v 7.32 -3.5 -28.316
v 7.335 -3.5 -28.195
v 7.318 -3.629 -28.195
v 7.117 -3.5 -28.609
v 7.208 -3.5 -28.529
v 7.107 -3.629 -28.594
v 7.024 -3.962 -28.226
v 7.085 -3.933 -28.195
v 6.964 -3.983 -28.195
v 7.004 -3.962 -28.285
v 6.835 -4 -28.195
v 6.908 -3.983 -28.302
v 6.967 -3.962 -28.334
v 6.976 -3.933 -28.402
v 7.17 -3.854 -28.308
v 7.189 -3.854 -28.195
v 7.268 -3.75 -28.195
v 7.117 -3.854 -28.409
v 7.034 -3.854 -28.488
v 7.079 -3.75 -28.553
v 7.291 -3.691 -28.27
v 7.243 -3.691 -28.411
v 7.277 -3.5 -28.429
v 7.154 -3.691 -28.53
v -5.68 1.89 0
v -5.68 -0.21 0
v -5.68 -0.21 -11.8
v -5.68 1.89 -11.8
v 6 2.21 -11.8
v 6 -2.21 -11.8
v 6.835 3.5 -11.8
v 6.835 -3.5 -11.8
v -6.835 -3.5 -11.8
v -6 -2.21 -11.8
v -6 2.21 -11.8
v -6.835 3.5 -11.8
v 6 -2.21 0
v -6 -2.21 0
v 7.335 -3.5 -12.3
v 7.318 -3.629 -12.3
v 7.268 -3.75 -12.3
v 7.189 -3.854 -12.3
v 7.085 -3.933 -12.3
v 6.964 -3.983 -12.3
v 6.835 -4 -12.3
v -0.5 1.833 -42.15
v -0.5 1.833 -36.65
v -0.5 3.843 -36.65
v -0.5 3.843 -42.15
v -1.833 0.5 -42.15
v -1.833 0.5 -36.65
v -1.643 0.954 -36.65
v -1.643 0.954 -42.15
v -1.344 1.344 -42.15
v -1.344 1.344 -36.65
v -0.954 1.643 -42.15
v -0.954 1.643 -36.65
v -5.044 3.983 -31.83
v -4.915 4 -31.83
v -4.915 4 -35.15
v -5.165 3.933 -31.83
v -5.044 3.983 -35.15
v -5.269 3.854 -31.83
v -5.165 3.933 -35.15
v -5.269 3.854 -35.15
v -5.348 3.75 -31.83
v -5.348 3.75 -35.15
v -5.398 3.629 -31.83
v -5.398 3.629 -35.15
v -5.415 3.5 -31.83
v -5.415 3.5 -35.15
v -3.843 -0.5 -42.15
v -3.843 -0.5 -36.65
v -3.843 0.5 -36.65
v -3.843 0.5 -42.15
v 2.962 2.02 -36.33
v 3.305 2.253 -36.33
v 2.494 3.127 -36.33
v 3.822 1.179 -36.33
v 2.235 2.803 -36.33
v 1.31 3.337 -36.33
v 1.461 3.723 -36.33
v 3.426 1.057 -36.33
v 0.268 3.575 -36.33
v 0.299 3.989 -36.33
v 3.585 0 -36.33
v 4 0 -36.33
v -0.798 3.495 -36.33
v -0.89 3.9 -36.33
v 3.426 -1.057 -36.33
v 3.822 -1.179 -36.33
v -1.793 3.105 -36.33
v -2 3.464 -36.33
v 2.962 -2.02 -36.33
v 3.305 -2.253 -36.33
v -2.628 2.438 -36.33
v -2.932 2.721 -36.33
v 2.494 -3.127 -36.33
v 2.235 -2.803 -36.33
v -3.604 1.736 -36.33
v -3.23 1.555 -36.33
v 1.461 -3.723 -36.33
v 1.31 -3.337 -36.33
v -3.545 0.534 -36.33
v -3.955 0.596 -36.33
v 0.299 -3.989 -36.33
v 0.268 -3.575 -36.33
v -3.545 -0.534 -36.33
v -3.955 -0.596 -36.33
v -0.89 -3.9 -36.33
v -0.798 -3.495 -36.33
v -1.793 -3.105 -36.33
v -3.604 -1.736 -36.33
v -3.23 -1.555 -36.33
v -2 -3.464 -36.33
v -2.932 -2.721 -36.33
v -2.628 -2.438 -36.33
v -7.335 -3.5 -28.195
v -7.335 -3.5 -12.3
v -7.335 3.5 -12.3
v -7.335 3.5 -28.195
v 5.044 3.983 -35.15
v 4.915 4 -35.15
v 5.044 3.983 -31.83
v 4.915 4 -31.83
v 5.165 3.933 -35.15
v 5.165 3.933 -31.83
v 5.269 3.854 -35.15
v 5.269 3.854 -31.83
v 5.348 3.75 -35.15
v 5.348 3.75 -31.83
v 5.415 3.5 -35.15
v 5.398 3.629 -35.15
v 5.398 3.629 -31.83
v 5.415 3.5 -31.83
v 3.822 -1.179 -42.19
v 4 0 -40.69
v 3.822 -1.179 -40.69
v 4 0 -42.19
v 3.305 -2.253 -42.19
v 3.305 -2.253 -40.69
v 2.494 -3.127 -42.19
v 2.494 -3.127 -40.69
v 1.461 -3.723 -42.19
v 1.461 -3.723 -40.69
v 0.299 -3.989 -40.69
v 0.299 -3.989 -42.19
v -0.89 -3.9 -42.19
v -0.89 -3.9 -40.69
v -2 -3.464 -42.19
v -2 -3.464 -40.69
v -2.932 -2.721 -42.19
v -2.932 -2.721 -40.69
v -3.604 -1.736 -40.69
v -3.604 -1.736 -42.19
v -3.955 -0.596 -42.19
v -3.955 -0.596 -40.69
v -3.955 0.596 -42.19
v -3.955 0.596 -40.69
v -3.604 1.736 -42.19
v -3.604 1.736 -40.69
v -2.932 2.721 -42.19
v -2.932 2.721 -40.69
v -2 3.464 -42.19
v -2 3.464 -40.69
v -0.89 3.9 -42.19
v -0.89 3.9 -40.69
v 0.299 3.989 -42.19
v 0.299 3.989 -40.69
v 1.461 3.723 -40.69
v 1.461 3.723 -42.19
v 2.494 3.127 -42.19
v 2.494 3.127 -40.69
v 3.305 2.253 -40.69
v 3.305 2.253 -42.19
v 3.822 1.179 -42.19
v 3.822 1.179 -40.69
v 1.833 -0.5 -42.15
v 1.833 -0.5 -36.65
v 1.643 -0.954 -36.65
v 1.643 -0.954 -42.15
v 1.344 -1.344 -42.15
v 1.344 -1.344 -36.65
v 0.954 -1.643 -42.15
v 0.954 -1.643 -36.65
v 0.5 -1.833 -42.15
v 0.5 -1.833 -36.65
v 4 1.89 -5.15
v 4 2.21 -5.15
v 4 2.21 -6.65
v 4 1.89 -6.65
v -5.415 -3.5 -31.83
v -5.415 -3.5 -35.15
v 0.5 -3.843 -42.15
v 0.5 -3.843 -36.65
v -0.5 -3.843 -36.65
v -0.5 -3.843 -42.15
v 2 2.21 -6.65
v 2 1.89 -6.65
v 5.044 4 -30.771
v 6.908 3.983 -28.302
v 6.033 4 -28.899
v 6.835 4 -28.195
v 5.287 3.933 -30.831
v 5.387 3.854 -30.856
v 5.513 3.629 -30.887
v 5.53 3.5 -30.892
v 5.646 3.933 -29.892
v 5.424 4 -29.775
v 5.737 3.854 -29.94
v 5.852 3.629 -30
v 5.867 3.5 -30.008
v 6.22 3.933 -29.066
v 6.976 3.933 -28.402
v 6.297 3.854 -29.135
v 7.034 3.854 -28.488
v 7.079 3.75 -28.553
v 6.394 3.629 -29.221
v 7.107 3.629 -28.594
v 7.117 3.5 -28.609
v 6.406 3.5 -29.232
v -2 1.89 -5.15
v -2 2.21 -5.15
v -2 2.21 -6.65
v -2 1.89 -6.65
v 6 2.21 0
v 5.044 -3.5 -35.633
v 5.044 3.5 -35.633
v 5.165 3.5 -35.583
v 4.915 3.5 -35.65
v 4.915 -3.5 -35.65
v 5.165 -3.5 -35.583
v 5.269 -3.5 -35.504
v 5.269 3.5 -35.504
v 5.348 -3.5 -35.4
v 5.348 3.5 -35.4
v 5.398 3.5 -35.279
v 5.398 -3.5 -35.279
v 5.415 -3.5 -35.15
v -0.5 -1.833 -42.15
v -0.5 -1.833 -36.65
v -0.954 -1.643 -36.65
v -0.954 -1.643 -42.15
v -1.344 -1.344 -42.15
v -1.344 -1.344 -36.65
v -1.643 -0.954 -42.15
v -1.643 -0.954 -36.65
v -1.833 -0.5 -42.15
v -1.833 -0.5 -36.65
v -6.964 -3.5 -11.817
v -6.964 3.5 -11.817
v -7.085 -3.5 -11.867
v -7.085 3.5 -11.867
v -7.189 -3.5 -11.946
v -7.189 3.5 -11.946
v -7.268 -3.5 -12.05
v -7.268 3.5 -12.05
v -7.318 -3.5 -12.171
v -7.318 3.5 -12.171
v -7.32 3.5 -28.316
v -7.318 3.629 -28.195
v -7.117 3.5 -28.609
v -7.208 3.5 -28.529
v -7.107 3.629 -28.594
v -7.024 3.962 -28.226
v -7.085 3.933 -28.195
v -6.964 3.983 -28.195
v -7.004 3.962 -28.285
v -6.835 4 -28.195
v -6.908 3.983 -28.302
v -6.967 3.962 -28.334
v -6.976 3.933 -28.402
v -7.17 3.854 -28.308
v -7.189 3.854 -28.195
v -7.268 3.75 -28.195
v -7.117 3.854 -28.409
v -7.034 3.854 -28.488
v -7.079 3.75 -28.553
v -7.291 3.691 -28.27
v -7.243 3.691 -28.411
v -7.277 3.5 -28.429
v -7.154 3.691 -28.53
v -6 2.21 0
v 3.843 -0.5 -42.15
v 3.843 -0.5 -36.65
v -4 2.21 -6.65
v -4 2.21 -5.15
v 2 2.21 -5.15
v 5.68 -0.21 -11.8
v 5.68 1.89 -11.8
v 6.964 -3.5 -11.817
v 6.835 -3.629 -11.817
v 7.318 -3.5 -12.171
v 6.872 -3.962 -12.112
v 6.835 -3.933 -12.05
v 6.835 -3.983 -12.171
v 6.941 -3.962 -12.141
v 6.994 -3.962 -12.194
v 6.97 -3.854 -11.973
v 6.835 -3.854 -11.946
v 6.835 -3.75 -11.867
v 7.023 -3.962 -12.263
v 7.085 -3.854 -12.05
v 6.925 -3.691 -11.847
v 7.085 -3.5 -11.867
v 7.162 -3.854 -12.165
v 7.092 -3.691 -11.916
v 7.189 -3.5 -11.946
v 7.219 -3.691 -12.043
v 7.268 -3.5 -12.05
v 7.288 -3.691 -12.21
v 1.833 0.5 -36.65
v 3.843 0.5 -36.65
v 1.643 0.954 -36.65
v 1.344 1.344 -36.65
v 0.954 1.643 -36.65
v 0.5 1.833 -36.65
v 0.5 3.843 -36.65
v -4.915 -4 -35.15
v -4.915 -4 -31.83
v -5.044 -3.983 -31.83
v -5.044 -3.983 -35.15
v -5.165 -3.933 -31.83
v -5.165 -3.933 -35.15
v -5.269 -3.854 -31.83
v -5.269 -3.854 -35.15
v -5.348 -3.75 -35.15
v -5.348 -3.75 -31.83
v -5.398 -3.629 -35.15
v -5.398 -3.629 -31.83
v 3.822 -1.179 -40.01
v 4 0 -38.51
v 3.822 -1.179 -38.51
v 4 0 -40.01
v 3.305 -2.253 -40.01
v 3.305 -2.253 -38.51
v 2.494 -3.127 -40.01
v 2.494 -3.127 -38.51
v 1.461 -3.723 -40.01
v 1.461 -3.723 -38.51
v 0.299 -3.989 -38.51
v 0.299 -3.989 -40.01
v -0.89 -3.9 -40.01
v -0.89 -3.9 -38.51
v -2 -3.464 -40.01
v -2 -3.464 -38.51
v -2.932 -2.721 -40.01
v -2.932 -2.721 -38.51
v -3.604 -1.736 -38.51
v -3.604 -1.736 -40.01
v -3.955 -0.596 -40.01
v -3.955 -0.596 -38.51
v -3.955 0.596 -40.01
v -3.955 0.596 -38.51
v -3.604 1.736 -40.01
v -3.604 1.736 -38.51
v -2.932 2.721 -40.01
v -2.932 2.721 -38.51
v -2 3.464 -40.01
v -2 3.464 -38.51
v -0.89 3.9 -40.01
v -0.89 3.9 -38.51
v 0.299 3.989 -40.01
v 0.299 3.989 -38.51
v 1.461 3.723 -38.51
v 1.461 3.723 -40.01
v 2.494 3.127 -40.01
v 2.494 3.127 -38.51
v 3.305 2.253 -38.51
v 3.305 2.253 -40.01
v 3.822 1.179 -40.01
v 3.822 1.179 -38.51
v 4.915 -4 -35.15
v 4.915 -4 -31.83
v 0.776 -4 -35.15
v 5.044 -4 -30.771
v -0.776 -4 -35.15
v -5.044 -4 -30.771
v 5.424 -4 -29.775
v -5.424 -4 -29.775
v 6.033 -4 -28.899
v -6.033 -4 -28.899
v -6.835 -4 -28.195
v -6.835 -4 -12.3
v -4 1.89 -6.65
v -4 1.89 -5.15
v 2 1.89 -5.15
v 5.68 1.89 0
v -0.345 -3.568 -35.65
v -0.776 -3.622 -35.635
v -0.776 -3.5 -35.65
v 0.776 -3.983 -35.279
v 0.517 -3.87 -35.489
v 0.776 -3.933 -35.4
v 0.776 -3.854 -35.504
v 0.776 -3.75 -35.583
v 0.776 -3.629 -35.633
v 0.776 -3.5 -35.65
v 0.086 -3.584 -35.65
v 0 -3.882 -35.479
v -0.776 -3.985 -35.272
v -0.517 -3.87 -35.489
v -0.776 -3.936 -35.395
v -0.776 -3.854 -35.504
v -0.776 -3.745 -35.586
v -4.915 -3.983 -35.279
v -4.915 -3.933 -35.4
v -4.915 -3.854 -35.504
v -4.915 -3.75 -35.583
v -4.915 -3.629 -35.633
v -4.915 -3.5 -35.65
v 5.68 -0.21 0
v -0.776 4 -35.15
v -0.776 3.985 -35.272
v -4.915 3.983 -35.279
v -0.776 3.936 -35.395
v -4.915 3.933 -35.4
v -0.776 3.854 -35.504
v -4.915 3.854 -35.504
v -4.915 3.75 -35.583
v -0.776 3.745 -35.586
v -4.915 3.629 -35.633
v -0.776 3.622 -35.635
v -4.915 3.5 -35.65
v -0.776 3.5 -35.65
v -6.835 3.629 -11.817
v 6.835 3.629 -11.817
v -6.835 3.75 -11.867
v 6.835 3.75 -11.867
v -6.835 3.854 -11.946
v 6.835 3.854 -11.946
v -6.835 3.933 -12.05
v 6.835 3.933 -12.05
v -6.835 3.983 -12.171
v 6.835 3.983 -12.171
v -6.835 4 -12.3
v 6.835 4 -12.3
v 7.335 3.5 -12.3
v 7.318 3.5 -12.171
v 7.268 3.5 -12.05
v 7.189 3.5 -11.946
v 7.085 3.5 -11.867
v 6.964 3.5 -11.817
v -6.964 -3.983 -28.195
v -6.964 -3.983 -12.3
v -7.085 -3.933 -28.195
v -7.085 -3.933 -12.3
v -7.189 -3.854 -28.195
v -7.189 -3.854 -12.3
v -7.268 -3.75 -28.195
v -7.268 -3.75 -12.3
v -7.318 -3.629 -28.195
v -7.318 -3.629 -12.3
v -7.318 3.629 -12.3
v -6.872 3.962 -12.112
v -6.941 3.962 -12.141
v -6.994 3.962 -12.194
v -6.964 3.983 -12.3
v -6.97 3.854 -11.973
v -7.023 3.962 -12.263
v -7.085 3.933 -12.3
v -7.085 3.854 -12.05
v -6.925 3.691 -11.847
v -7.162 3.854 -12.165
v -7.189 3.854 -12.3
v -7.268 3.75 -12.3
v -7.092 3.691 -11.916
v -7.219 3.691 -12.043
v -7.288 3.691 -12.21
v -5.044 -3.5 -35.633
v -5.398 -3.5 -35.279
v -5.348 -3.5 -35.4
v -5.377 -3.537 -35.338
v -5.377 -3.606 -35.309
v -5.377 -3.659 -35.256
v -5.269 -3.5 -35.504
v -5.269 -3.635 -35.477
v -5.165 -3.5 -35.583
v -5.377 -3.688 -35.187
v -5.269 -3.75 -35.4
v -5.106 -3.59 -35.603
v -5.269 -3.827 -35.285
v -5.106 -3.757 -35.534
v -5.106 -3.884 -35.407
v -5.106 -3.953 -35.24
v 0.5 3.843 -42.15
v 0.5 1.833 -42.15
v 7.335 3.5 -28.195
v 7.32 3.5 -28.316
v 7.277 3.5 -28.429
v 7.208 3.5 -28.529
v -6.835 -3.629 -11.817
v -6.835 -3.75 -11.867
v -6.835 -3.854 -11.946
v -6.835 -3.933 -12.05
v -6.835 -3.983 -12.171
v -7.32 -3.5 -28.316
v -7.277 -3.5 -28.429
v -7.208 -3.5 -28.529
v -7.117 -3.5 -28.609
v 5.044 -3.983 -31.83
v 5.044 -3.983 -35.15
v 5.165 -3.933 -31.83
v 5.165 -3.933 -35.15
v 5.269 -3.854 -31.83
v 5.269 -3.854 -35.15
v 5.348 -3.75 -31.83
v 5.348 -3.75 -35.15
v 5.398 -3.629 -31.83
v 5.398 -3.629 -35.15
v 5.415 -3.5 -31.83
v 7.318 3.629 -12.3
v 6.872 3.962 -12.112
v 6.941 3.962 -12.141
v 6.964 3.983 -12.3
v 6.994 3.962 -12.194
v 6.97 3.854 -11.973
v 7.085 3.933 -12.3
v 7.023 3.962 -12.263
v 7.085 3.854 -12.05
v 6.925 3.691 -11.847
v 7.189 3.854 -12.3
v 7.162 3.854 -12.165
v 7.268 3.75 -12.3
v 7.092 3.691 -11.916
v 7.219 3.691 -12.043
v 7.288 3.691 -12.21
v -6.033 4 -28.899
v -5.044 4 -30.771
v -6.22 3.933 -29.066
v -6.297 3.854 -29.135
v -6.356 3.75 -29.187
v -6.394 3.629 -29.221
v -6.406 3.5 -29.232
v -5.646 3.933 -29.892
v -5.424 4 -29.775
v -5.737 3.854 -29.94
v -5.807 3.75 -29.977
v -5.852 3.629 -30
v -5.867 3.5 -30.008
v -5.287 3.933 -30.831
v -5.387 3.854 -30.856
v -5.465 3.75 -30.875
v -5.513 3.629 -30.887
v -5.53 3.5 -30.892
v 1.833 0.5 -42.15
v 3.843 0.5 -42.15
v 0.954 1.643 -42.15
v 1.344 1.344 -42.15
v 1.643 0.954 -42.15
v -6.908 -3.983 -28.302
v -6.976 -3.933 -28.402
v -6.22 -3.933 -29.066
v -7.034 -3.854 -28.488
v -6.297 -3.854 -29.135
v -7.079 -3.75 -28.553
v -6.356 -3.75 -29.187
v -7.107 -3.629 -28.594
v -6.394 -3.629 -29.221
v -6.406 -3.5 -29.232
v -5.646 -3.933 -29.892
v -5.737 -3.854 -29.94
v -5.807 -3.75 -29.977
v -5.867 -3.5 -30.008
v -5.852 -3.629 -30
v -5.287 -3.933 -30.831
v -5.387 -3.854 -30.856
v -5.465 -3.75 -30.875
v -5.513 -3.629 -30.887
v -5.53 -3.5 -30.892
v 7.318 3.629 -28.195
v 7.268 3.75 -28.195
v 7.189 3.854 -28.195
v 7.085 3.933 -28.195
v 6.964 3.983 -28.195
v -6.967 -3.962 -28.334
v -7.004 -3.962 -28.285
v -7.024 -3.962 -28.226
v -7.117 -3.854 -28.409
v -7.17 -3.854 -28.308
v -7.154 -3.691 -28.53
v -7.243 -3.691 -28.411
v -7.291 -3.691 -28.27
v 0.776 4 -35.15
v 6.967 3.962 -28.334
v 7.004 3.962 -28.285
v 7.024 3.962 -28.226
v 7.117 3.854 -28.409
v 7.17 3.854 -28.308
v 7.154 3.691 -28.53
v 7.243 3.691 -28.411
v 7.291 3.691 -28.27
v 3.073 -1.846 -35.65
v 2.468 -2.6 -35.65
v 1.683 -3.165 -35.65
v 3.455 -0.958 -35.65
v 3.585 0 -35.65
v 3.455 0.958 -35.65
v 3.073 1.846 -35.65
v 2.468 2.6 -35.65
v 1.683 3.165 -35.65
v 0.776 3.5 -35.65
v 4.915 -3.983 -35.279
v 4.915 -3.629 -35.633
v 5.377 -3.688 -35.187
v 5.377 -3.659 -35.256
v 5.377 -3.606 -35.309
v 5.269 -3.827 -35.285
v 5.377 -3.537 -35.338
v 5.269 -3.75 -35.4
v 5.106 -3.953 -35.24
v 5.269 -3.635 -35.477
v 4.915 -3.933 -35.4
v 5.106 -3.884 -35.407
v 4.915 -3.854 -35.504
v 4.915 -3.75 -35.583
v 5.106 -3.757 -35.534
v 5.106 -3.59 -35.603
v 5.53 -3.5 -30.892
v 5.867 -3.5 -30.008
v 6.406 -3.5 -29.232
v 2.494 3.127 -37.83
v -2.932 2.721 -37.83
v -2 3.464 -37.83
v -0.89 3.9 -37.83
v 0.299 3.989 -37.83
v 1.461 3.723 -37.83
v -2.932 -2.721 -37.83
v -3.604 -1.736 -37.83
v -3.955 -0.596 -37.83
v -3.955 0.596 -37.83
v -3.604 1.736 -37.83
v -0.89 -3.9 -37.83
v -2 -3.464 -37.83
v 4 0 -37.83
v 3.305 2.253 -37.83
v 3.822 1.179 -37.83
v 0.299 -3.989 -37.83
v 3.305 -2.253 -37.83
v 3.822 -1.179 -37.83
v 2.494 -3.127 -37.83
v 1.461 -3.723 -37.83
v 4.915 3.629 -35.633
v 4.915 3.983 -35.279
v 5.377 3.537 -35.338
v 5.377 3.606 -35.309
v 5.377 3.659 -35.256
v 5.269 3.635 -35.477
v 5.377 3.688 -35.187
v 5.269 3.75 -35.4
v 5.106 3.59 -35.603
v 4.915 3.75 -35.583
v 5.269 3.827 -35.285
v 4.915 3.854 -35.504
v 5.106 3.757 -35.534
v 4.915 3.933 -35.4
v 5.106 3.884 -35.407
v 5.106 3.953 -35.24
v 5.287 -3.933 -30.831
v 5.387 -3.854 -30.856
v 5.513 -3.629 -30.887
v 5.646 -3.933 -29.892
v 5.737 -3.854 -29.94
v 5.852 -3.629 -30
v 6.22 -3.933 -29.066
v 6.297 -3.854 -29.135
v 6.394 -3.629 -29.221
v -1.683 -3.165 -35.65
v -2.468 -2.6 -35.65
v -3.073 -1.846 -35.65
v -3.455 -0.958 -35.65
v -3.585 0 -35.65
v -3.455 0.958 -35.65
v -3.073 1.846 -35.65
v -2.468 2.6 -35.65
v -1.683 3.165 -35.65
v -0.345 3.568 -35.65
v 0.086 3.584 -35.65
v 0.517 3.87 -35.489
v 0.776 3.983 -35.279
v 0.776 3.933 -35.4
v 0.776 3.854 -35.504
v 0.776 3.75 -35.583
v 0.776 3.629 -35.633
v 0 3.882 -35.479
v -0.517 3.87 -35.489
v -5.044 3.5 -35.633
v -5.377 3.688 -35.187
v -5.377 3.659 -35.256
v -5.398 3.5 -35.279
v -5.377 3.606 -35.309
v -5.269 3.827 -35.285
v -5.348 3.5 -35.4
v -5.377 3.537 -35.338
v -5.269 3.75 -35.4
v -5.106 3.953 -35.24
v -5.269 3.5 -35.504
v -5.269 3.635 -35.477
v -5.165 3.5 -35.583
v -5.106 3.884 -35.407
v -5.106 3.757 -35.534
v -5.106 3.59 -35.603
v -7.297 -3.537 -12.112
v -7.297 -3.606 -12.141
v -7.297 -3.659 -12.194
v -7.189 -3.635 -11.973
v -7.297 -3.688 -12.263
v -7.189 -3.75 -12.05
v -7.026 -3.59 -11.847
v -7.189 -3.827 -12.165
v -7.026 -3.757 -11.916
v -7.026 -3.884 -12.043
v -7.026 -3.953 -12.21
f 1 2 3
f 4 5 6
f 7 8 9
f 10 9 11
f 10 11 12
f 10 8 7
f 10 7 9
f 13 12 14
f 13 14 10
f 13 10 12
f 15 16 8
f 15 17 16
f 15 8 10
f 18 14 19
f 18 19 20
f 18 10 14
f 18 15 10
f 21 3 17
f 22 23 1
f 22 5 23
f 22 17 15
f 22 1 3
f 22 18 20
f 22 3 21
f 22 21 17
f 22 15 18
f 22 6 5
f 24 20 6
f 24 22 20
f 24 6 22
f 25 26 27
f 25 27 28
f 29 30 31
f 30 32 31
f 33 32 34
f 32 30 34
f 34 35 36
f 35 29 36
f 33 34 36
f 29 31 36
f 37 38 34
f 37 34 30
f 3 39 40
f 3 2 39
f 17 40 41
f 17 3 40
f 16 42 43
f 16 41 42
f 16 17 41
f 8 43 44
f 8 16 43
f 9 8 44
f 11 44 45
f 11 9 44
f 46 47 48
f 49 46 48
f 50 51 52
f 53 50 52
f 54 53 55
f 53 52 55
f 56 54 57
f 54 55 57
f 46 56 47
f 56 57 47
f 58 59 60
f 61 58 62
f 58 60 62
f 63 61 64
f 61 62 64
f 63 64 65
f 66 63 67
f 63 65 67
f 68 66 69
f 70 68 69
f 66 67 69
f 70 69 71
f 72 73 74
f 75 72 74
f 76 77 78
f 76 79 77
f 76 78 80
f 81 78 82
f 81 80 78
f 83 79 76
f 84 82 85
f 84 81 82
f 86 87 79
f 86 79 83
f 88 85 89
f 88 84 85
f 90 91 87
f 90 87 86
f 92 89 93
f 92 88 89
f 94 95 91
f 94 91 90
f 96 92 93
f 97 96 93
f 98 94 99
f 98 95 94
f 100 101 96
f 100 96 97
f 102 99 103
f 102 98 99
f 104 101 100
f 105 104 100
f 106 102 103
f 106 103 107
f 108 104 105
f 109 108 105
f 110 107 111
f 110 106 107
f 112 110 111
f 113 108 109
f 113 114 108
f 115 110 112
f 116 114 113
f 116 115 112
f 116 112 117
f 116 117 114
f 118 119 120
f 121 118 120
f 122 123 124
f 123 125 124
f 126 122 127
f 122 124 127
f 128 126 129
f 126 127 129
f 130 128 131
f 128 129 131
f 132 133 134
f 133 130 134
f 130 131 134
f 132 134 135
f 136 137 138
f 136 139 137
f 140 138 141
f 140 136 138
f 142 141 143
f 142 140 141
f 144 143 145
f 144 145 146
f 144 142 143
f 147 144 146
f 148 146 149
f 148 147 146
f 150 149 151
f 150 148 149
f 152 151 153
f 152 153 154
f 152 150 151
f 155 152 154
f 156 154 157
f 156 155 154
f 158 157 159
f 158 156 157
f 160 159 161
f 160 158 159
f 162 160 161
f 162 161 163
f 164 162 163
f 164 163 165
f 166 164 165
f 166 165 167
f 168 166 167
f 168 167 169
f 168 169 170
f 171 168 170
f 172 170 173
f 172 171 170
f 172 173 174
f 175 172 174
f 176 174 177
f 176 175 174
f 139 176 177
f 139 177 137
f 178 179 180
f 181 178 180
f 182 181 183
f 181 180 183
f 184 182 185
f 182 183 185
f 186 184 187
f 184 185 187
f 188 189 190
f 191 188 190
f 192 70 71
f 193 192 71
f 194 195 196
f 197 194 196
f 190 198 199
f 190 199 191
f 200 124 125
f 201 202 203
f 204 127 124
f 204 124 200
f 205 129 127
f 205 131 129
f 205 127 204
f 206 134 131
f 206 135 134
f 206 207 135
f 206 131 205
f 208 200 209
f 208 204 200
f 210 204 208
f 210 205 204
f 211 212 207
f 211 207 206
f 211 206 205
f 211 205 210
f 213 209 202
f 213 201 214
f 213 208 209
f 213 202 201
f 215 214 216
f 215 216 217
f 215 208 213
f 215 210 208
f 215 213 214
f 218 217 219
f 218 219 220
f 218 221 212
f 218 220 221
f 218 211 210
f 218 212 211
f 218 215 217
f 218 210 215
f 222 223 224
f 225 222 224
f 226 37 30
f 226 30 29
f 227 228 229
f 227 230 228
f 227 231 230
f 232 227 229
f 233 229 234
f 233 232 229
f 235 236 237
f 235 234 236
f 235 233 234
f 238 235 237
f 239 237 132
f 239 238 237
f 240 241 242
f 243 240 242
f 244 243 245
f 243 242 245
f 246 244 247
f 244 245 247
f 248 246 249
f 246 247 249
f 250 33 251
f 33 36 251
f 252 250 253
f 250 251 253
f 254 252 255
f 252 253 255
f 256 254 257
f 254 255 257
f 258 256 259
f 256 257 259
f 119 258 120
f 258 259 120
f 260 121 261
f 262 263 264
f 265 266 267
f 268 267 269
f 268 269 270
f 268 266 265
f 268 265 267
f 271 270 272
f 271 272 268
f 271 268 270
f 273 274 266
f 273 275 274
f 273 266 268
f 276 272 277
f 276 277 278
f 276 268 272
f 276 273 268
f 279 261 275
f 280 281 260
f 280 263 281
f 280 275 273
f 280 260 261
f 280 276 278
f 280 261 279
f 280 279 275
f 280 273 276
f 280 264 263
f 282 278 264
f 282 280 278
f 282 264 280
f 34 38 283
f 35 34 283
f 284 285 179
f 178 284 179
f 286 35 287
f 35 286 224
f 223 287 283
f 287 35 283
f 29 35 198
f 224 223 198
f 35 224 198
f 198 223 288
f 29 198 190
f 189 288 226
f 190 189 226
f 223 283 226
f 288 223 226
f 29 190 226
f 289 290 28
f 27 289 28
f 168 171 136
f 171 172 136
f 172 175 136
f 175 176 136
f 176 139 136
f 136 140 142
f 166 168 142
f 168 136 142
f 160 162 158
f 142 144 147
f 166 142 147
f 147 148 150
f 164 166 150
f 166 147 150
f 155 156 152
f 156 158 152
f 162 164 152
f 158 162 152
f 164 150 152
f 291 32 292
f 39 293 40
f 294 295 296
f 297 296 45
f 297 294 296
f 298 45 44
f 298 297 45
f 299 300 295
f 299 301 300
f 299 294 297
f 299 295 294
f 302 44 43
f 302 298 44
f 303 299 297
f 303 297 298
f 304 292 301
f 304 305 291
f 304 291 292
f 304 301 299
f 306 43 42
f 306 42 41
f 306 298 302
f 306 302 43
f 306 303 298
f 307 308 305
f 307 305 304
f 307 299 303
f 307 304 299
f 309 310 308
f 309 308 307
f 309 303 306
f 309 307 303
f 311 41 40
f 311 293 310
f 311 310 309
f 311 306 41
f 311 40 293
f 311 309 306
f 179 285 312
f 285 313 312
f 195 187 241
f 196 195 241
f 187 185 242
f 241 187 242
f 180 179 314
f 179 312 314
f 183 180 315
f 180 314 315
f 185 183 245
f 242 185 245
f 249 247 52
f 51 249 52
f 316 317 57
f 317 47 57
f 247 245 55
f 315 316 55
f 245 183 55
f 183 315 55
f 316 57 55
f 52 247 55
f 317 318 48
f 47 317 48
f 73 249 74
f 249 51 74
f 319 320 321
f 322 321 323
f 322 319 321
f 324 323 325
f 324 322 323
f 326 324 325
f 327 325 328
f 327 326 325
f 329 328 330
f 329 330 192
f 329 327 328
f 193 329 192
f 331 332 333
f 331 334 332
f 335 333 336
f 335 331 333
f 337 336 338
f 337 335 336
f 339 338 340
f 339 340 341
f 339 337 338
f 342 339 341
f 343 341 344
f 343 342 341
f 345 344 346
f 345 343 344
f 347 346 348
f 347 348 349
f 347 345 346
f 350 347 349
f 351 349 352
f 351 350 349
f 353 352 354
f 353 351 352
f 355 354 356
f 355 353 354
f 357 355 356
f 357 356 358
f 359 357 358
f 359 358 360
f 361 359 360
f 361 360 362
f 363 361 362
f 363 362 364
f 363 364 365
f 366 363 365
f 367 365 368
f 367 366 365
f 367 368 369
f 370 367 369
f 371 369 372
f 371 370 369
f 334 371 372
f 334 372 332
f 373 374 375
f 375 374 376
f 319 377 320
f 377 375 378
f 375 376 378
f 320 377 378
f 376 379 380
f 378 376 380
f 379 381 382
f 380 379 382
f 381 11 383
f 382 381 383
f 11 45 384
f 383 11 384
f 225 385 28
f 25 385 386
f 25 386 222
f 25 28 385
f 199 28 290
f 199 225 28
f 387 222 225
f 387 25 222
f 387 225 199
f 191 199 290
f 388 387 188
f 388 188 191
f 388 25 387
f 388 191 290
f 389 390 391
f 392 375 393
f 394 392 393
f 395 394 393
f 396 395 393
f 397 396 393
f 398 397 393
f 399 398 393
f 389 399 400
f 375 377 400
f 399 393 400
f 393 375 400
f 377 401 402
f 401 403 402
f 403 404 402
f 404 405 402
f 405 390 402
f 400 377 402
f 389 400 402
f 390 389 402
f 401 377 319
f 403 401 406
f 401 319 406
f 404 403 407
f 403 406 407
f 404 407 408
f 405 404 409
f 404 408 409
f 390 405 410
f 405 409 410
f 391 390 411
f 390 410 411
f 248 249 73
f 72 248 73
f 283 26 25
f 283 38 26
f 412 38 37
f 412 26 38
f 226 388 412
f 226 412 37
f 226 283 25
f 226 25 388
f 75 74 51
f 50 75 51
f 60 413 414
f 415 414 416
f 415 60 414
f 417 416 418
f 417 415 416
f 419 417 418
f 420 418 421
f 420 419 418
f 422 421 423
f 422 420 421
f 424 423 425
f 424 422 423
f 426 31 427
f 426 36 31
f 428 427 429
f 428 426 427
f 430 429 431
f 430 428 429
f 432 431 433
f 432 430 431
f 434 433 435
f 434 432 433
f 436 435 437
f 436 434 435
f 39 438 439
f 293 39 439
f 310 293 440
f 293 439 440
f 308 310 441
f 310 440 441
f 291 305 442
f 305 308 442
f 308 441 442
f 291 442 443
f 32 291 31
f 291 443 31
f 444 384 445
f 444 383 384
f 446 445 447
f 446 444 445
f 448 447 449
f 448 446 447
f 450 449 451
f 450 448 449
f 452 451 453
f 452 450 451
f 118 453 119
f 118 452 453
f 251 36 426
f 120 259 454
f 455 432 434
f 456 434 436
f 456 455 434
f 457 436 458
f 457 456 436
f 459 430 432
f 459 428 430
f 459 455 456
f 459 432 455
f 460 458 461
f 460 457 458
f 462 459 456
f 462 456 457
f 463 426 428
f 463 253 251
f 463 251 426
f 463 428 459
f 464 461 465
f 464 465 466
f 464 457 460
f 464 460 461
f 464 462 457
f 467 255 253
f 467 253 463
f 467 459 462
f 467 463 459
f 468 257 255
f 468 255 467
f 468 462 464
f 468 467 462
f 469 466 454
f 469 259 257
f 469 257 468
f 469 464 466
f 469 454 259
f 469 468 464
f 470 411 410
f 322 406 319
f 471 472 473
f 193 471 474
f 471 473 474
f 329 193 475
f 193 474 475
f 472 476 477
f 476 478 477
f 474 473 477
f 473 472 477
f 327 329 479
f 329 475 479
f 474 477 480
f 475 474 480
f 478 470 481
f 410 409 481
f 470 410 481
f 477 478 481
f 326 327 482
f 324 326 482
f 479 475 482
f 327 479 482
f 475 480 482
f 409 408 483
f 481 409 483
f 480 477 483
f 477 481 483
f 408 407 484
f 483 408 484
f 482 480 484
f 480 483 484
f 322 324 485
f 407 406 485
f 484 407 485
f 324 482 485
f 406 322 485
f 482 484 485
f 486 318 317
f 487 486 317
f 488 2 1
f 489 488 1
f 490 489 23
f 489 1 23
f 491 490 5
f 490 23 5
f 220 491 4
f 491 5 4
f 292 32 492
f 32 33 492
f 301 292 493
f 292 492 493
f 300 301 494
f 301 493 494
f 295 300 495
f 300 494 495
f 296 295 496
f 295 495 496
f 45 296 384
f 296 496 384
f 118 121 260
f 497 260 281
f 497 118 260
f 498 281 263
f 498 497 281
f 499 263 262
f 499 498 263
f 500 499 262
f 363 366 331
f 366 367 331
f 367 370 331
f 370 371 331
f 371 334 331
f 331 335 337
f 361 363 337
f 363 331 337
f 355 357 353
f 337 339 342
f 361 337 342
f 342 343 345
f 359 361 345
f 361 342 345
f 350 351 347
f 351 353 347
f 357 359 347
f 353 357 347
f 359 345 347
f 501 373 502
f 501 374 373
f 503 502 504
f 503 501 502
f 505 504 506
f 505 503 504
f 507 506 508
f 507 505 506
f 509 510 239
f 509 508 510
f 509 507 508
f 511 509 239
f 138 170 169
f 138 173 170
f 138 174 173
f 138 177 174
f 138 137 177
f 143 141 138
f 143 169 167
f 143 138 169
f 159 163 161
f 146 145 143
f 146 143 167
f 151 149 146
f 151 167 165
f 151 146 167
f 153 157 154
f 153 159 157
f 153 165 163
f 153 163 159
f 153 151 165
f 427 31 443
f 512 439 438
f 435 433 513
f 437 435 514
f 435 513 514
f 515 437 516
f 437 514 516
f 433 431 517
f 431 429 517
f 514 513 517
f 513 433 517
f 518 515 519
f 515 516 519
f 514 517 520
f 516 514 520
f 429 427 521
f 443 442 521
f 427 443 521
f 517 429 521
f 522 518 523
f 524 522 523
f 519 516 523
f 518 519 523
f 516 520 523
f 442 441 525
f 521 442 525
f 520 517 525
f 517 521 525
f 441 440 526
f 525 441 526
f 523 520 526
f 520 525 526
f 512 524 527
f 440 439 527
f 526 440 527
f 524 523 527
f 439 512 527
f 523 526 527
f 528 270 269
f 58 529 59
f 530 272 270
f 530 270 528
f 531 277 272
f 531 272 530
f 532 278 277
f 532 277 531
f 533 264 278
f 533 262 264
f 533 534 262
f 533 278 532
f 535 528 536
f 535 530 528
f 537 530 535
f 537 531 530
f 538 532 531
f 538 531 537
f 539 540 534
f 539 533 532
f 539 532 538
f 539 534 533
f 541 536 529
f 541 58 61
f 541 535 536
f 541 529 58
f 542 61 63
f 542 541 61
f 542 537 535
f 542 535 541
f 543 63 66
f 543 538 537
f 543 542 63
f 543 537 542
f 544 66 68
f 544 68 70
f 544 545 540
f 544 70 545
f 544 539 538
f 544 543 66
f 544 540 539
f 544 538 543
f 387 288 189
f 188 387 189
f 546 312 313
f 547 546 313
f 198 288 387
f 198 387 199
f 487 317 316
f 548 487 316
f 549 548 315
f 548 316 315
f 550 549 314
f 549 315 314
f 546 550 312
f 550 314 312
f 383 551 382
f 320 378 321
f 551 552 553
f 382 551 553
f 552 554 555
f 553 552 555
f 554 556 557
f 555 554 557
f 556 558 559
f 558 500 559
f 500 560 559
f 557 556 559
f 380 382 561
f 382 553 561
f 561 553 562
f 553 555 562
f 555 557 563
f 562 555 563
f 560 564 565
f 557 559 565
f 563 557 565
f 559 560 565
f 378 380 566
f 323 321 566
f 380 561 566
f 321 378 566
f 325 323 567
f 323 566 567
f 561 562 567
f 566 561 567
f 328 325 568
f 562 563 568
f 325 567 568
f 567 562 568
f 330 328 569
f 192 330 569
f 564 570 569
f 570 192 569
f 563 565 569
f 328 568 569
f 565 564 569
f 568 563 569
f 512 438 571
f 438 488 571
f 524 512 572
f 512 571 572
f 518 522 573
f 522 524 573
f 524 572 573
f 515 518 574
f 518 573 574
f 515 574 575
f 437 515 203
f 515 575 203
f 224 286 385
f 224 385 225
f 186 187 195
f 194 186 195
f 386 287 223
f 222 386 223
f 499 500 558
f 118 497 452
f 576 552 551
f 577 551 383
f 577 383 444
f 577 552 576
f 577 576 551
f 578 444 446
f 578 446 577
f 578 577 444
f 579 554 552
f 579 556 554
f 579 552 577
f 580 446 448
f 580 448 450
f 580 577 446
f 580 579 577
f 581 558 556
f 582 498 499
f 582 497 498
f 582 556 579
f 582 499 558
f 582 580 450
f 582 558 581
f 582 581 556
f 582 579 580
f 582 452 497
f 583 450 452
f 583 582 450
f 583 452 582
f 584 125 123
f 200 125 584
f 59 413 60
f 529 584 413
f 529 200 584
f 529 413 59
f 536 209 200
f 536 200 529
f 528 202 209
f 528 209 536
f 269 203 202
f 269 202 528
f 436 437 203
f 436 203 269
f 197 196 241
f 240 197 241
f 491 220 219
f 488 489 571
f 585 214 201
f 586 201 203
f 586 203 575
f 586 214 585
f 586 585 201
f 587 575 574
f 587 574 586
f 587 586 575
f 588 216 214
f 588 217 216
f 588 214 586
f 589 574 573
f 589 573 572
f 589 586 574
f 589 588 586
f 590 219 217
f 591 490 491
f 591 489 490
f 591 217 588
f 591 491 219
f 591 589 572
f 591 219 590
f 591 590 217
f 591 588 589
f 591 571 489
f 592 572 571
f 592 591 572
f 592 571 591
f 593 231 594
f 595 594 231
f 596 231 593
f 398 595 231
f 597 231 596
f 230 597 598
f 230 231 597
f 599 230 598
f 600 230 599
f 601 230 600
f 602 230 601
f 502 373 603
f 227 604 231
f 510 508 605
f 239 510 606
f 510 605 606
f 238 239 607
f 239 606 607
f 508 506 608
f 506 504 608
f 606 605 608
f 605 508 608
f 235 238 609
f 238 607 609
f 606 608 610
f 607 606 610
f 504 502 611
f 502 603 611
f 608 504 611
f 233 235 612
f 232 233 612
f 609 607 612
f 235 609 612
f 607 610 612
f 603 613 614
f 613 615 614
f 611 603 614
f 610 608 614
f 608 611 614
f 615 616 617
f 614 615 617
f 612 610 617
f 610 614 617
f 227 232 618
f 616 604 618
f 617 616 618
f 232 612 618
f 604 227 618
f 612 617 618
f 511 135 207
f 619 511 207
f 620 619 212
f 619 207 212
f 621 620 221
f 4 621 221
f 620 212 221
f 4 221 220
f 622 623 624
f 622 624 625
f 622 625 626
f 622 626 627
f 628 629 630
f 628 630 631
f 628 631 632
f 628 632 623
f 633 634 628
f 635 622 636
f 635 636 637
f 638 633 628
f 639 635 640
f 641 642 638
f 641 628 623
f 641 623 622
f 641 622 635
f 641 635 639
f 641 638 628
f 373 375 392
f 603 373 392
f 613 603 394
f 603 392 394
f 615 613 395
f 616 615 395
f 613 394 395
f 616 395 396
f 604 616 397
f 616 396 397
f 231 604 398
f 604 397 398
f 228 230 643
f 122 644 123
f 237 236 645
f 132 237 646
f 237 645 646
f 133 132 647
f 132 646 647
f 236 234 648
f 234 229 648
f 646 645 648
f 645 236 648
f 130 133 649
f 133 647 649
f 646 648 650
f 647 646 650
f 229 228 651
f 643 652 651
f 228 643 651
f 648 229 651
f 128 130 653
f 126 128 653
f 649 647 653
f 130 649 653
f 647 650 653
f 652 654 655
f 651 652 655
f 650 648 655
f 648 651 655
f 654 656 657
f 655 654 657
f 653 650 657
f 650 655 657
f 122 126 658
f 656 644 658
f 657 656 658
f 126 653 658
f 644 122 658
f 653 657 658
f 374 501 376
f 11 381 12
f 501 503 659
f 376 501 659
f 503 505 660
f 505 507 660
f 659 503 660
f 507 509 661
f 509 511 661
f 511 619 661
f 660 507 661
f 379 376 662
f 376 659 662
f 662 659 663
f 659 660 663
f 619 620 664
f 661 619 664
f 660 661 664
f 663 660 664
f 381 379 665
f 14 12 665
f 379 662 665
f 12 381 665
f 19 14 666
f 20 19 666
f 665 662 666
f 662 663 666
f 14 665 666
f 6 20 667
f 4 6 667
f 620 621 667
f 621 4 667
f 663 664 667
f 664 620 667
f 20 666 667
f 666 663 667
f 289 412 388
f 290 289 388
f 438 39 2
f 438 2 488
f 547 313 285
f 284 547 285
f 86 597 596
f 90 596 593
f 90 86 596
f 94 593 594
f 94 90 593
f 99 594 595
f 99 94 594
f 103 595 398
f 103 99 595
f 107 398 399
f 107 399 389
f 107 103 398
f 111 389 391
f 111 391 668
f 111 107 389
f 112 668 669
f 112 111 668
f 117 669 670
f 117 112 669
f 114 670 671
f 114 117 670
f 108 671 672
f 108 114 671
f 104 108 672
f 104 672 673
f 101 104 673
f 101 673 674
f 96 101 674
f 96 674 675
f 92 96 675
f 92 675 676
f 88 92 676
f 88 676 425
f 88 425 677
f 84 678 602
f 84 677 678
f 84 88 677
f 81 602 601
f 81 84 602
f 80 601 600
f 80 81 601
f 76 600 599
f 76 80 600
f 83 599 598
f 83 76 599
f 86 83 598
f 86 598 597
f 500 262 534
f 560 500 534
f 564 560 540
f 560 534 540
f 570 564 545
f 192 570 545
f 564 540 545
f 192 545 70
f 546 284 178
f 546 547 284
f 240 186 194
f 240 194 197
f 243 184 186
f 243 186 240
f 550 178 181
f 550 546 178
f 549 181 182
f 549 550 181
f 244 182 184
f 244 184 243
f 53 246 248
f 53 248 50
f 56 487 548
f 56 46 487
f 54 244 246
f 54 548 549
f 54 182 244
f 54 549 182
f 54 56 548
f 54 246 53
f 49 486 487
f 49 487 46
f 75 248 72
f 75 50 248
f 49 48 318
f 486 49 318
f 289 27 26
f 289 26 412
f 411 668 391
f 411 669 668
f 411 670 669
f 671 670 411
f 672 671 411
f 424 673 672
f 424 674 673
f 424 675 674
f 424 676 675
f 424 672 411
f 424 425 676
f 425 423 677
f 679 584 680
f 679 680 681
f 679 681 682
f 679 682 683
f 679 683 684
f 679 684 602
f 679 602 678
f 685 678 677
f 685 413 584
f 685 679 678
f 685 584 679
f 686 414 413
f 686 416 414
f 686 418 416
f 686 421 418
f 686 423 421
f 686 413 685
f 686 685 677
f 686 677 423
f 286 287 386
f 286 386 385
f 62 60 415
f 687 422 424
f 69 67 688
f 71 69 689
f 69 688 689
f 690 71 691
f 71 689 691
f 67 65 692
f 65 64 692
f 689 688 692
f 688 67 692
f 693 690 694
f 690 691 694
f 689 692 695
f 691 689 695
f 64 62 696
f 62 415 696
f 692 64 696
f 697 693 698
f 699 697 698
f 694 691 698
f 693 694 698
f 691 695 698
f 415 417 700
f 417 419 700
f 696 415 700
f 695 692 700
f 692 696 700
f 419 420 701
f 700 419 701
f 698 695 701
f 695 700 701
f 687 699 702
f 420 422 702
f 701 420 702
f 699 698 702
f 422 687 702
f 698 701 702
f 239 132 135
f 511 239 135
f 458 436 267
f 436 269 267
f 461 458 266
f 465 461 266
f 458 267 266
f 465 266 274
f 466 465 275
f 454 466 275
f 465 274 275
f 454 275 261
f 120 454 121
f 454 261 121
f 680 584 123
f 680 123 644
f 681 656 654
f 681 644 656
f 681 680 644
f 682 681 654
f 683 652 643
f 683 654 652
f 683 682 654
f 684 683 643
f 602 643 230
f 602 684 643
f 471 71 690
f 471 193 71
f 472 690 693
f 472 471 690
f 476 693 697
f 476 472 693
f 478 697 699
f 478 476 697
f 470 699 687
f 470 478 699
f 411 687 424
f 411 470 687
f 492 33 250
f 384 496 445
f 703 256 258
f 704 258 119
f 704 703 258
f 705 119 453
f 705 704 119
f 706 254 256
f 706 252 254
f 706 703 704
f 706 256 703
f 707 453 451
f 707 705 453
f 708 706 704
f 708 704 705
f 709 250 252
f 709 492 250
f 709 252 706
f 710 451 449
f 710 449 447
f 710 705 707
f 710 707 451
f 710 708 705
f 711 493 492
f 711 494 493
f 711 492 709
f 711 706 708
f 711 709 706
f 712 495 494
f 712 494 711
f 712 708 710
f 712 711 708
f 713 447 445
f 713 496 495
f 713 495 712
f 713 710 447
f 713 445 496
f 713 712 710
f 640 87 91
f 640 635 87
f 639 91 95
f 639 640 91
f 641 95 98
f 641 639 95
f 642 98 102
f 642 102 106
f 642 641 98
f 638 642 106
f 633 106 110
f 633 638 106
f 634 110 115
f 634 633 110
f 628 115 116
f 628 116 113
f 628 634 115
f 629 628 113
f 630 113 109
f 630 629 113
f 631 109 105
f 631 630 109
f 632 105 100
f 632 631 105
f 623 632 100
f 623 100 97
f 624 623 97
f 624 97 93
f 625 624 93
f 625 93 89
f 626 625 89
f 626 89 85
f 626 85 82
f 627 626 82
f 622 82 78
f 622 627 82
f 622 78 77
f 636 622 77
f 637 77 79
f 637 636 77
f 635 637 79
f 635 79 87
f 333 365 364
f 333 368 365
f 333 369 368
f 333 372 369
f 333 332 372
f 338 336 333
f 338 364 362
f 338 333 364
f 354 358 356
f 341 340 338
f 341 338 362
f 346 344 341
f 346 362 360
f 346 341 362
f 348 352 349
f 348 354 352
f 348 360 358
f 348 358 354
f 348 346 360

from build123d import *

# Parameters (mm, degrees)
SKETCH1_W           = 12
SKETCH1_H           = 4.42
SKETCH1_W_2         = 11.36
SKETCH1_H_2         = 2.1
BOSS_EXTRUDE1_DEPTH = 11.8
CUT_EXTRUDE1_REACH  = 15.956
SKETCH4_W           = 2
SKETCH4_H           = 1.5
SKETCH5_W           = 14.67
SKETCH5_H           = 8
BOSS_EXTRUDE2_DEPTH = 23.85
CUT_EXTRUDE2_DEPTH  = 38.26559707
BOSS_EXTRUDE4_START = 1
BOSS_EXTRUDE4_DEPTH = 5.5
SKETCH9_W           = 4
SKETCH9_H           = 1.5
FILLET1_R           = 0.5


with BuildPart() as part:
    # Sketch1 → Boss-Extrude1 (new body)
    with BuildSketch(Plane.XY):
        Rectangle(SKETCH1_W, SKETCH1_H)
        with Locations((0, 0.84)):
            Rectangle(SKETCH1_W_2, SKETCH1_H_2, mode=Mode.SUBTRACT)
    extrude(amount=-BOSS_EXTRUDE1_DEPTH)

    # Sketch4 → Cut-Extrude1 (cut, up to next)
    with BuildSketch(Plane(origin=(0, 2.21, 0), x_dir=(1, 0, 0), z_dir=(0, 1, 0)), mode=Mode.PRIVATE) as cut_extrude1_sk1:
        with Locations((3, 5.9)):
            Rectangle(SKETCH4_W, SKETCH4_H)
    cut_extrude1_tool1 = extrude(cut_extrude1_sk1.sketch, amount=-CUT_EXTRUDE1_REACH, mode=Mode.PRIVATE) & part.part
    # Sketch4 → Cut-Extrude1 (cut, up to next)
    with BuildSketch(Plane(origin=(0, 2.21, 0), x_dir=(1, 0, 0), z_dir=(0, 1, 0)), mode=Mode.PRIVATE) as cut_extrude1_sk2:
        with Locations((-3, 5.9)):
            Rectangle(SKETCH4_W, SKETCH4_H)
    cut_extrude1_tool2 = extrude(cut_extrude1_sk2.sketch, amount=-CUT_EXTRUDE1_REACH, mode=Mode.PRIVATE) & part.part
    add(cut_extrude1_tool1.solids().sort_by_distance((3, 2.21, -5.9))[0], mode=Mode.SUBTRACT)
    add(cut_extrude1_tool2.solids().sort_by_distance((-3, 2.21, -5.9))[0], mode=Mode.SUBTRACT)

    # Sketch5 → Boss-Extrude2 (add)
    with BuildSketch(Plane(origin=(0, 0, -11.8), x_dir=(-1, 0, 0), z_dir=(0, 0, -1))):
        Rectangle(SKETCH5_W, SKETCH5_H)
    extrude(amount=BOSS_EXTRUDE2_DEPTH)

    # Sketch6 → Cut-Extrude2 (cut, through all)
    with BuildSketch(Plane(origin=(0, 4, 0), x_dir=(1, 0, 0), z_dir=(0, 1, 0))):
        with BuildLine():
            Line((7.335, 35.65), (5.415, 35.65))
            Line((5.415, 35.65), (5.415, 31.83))
            ThreePointArc((5.415, 31.83), (5.928851746, 29.89505814), (7.335, 28.47))
            Line((7.335, 28.47), (7.335, 35.65))
        make_face()
        with BuildLine():
            Line((-5.415, 31.83), (-5.415, 35.65))
            Line((-5.415, 35.65), (-7.335, 35.65))
            Line((-7.335, 35.65), (-7.335, 28.47))
            ThreePointArc((-7.335, 28.47), (-5.928851746, 29.89505814), (-5.415, 31.83))
        make_face()
    extrude(amount=-CUT_EXTRUDE2_DEPTH, mode=Mode.SUBTRACT)

    # Sketch9 → Revolve1 (revolve)
    with BuildSketch(Plane(origin=(0, 0, 0), x_dir=(1, 0, 0), z_dir=(0, 1, 0))):
        with Locations((2, 41.44)):
            Rectangle(SKETCH9_W, SKETCH9_H)
        with Locations((2, 39.26)):
            Rectangle(SKETCH9_W, SKETCH9_H)
        Polygon((0, 37.83), (0, 35.65), (3.585, 35.65), (3.585, 36.33), (4, 36.33), (4, 37.83), align=None)
    revolve(axis=Axis((0, 0, -35.65), (0, 0, -1)))


with BuildPart() as body_2:
    # Sketch8 → Boss-Extrude4 (new body)
    with BuildSketch(Plane(origin=(0, 0, -35.65), x_dir=(-1, 0, 0), z_dir=(0, 0, -1)).offset(BOSS_EXTRUDE4_START)):
        with BuildLine():
            Line((0, 3.842606537), (-0.5, 3.842606537))
            Line((-0.5, 3.842606537), (-0.5, 1.833030278))
            ThreePointArc((-0.5, 1.833030278), (-1.343502884, 1.343502884), (-1.833030278, 0.5))
            Line((-1.833030278, 0.5), (-3.842606537, 0.5))
            Line((-3.842606537, 0.5), (-3.842606537, 0))
            Line((-3.842606537, 0), (-3.842606537, -0.5))
            Line((-3.842606537, -0.5), (-1.833030278, -0.5))
            ThreePointArc((-1.833030278, -0.5), (-1.343502884, -1.343502884), (-0.5, -1.833030278))
            Line((-0.5, -1.833030278), (-0.5, -3.842606537))
            Line((-0.5, -3.842606537), (0, -3.842606537))
            Line((0, -3.842606537), (0.5, -3.842606537))
            Line((0.5, -3.842606537), (0.5, -1.833030278))
            ThreePointArc((0.5, -1.833030278), (1.343502884, -1.343502884), (1.833030278, -0.5))
            Line((1.833030278, -0.5), (3.842606537, -0.5))
            Line((3.842606537, -0.5), (3.842606537, 0))
            Line((3.842606537, 0), (3.842606537, 0.5))
            Line((3.842606537, 0.5), (1.833030278, 0.5))
            ThreePointArc((1.833030278, 0.5), (1.343502884, 1.343502884), (0.5, 1.833030278))
            Line((0.5, 1.833030278), (0.5, 3.842606537))
            Line((0.5, 3.842606537), (0, 3.842606537))
        make_face()
    extrude(amount=BOSS_EXTRUDE4_DEPTH)


with BuildPart() as revolve1_piece_1:
    # of the separate pieces the step leaves, piece 1, a body of its own (revolve1_pieces)
    add(part.part.solids().sort_by_distance((-7.335, -4, -11.8))[0])

    # Fillet1
    fillet1_edges = [revolve1_piece_1.edges().sort_by_distance(p)[0] for p in [
        (-5.928851746, -4, -29.89505814),
        (5.928851746, -4, -29.89505814),
        (7.335, 4, -20.135),
        (0, 4, -11.8),
        (-7.335, 4, -20.135),
        (-5.928851746, 4, -29.89505814),
        (-5.415, 4, -33.74),
        (0, 4, -35.65),
        (5.415, 4, -33.74),
        (5.928851746, 4, -29.89505814),
        (0, -4, -35.65),
        (0, -4, -11.8),
        (-5.415, 0, -35.65),
        (5.415, 0, -35.65),
        (7.335, 0, -11.8),
        (7.335, 0, -28.47),
        (-7.335, 0, -28.47),
        (-7.335, 0, -11.8),
        (-7.335, -4, -20.135),
        (-5.415, -4, -33.74),
        (5.415, -4, -33.74),
        (7.335, -4, -20.135),
    ]]
    fillet(fillet1_edges, radius=FILLET1_R)


with BuildPart() as revolve1_piece_2:
    # of the separate pieces the step leaves, piece 2, a body of its own (revolve1_pieces)
    add(part.part.solids().sort_by_distance((4, 0, -38.51))[0])


with BuildPart() as revolve1_piece_3:
    # of the separate pieces the step leaves, piece 3, a body of its own (revolve1_pieces)
    add(part.part.solids().sort_by_distance((4, 0, -40.69))[0])


solid = Compound([body_2.part, revolve1_piece_1.part, revolve1_piece_2.part, revolve1_piece_3.part])
